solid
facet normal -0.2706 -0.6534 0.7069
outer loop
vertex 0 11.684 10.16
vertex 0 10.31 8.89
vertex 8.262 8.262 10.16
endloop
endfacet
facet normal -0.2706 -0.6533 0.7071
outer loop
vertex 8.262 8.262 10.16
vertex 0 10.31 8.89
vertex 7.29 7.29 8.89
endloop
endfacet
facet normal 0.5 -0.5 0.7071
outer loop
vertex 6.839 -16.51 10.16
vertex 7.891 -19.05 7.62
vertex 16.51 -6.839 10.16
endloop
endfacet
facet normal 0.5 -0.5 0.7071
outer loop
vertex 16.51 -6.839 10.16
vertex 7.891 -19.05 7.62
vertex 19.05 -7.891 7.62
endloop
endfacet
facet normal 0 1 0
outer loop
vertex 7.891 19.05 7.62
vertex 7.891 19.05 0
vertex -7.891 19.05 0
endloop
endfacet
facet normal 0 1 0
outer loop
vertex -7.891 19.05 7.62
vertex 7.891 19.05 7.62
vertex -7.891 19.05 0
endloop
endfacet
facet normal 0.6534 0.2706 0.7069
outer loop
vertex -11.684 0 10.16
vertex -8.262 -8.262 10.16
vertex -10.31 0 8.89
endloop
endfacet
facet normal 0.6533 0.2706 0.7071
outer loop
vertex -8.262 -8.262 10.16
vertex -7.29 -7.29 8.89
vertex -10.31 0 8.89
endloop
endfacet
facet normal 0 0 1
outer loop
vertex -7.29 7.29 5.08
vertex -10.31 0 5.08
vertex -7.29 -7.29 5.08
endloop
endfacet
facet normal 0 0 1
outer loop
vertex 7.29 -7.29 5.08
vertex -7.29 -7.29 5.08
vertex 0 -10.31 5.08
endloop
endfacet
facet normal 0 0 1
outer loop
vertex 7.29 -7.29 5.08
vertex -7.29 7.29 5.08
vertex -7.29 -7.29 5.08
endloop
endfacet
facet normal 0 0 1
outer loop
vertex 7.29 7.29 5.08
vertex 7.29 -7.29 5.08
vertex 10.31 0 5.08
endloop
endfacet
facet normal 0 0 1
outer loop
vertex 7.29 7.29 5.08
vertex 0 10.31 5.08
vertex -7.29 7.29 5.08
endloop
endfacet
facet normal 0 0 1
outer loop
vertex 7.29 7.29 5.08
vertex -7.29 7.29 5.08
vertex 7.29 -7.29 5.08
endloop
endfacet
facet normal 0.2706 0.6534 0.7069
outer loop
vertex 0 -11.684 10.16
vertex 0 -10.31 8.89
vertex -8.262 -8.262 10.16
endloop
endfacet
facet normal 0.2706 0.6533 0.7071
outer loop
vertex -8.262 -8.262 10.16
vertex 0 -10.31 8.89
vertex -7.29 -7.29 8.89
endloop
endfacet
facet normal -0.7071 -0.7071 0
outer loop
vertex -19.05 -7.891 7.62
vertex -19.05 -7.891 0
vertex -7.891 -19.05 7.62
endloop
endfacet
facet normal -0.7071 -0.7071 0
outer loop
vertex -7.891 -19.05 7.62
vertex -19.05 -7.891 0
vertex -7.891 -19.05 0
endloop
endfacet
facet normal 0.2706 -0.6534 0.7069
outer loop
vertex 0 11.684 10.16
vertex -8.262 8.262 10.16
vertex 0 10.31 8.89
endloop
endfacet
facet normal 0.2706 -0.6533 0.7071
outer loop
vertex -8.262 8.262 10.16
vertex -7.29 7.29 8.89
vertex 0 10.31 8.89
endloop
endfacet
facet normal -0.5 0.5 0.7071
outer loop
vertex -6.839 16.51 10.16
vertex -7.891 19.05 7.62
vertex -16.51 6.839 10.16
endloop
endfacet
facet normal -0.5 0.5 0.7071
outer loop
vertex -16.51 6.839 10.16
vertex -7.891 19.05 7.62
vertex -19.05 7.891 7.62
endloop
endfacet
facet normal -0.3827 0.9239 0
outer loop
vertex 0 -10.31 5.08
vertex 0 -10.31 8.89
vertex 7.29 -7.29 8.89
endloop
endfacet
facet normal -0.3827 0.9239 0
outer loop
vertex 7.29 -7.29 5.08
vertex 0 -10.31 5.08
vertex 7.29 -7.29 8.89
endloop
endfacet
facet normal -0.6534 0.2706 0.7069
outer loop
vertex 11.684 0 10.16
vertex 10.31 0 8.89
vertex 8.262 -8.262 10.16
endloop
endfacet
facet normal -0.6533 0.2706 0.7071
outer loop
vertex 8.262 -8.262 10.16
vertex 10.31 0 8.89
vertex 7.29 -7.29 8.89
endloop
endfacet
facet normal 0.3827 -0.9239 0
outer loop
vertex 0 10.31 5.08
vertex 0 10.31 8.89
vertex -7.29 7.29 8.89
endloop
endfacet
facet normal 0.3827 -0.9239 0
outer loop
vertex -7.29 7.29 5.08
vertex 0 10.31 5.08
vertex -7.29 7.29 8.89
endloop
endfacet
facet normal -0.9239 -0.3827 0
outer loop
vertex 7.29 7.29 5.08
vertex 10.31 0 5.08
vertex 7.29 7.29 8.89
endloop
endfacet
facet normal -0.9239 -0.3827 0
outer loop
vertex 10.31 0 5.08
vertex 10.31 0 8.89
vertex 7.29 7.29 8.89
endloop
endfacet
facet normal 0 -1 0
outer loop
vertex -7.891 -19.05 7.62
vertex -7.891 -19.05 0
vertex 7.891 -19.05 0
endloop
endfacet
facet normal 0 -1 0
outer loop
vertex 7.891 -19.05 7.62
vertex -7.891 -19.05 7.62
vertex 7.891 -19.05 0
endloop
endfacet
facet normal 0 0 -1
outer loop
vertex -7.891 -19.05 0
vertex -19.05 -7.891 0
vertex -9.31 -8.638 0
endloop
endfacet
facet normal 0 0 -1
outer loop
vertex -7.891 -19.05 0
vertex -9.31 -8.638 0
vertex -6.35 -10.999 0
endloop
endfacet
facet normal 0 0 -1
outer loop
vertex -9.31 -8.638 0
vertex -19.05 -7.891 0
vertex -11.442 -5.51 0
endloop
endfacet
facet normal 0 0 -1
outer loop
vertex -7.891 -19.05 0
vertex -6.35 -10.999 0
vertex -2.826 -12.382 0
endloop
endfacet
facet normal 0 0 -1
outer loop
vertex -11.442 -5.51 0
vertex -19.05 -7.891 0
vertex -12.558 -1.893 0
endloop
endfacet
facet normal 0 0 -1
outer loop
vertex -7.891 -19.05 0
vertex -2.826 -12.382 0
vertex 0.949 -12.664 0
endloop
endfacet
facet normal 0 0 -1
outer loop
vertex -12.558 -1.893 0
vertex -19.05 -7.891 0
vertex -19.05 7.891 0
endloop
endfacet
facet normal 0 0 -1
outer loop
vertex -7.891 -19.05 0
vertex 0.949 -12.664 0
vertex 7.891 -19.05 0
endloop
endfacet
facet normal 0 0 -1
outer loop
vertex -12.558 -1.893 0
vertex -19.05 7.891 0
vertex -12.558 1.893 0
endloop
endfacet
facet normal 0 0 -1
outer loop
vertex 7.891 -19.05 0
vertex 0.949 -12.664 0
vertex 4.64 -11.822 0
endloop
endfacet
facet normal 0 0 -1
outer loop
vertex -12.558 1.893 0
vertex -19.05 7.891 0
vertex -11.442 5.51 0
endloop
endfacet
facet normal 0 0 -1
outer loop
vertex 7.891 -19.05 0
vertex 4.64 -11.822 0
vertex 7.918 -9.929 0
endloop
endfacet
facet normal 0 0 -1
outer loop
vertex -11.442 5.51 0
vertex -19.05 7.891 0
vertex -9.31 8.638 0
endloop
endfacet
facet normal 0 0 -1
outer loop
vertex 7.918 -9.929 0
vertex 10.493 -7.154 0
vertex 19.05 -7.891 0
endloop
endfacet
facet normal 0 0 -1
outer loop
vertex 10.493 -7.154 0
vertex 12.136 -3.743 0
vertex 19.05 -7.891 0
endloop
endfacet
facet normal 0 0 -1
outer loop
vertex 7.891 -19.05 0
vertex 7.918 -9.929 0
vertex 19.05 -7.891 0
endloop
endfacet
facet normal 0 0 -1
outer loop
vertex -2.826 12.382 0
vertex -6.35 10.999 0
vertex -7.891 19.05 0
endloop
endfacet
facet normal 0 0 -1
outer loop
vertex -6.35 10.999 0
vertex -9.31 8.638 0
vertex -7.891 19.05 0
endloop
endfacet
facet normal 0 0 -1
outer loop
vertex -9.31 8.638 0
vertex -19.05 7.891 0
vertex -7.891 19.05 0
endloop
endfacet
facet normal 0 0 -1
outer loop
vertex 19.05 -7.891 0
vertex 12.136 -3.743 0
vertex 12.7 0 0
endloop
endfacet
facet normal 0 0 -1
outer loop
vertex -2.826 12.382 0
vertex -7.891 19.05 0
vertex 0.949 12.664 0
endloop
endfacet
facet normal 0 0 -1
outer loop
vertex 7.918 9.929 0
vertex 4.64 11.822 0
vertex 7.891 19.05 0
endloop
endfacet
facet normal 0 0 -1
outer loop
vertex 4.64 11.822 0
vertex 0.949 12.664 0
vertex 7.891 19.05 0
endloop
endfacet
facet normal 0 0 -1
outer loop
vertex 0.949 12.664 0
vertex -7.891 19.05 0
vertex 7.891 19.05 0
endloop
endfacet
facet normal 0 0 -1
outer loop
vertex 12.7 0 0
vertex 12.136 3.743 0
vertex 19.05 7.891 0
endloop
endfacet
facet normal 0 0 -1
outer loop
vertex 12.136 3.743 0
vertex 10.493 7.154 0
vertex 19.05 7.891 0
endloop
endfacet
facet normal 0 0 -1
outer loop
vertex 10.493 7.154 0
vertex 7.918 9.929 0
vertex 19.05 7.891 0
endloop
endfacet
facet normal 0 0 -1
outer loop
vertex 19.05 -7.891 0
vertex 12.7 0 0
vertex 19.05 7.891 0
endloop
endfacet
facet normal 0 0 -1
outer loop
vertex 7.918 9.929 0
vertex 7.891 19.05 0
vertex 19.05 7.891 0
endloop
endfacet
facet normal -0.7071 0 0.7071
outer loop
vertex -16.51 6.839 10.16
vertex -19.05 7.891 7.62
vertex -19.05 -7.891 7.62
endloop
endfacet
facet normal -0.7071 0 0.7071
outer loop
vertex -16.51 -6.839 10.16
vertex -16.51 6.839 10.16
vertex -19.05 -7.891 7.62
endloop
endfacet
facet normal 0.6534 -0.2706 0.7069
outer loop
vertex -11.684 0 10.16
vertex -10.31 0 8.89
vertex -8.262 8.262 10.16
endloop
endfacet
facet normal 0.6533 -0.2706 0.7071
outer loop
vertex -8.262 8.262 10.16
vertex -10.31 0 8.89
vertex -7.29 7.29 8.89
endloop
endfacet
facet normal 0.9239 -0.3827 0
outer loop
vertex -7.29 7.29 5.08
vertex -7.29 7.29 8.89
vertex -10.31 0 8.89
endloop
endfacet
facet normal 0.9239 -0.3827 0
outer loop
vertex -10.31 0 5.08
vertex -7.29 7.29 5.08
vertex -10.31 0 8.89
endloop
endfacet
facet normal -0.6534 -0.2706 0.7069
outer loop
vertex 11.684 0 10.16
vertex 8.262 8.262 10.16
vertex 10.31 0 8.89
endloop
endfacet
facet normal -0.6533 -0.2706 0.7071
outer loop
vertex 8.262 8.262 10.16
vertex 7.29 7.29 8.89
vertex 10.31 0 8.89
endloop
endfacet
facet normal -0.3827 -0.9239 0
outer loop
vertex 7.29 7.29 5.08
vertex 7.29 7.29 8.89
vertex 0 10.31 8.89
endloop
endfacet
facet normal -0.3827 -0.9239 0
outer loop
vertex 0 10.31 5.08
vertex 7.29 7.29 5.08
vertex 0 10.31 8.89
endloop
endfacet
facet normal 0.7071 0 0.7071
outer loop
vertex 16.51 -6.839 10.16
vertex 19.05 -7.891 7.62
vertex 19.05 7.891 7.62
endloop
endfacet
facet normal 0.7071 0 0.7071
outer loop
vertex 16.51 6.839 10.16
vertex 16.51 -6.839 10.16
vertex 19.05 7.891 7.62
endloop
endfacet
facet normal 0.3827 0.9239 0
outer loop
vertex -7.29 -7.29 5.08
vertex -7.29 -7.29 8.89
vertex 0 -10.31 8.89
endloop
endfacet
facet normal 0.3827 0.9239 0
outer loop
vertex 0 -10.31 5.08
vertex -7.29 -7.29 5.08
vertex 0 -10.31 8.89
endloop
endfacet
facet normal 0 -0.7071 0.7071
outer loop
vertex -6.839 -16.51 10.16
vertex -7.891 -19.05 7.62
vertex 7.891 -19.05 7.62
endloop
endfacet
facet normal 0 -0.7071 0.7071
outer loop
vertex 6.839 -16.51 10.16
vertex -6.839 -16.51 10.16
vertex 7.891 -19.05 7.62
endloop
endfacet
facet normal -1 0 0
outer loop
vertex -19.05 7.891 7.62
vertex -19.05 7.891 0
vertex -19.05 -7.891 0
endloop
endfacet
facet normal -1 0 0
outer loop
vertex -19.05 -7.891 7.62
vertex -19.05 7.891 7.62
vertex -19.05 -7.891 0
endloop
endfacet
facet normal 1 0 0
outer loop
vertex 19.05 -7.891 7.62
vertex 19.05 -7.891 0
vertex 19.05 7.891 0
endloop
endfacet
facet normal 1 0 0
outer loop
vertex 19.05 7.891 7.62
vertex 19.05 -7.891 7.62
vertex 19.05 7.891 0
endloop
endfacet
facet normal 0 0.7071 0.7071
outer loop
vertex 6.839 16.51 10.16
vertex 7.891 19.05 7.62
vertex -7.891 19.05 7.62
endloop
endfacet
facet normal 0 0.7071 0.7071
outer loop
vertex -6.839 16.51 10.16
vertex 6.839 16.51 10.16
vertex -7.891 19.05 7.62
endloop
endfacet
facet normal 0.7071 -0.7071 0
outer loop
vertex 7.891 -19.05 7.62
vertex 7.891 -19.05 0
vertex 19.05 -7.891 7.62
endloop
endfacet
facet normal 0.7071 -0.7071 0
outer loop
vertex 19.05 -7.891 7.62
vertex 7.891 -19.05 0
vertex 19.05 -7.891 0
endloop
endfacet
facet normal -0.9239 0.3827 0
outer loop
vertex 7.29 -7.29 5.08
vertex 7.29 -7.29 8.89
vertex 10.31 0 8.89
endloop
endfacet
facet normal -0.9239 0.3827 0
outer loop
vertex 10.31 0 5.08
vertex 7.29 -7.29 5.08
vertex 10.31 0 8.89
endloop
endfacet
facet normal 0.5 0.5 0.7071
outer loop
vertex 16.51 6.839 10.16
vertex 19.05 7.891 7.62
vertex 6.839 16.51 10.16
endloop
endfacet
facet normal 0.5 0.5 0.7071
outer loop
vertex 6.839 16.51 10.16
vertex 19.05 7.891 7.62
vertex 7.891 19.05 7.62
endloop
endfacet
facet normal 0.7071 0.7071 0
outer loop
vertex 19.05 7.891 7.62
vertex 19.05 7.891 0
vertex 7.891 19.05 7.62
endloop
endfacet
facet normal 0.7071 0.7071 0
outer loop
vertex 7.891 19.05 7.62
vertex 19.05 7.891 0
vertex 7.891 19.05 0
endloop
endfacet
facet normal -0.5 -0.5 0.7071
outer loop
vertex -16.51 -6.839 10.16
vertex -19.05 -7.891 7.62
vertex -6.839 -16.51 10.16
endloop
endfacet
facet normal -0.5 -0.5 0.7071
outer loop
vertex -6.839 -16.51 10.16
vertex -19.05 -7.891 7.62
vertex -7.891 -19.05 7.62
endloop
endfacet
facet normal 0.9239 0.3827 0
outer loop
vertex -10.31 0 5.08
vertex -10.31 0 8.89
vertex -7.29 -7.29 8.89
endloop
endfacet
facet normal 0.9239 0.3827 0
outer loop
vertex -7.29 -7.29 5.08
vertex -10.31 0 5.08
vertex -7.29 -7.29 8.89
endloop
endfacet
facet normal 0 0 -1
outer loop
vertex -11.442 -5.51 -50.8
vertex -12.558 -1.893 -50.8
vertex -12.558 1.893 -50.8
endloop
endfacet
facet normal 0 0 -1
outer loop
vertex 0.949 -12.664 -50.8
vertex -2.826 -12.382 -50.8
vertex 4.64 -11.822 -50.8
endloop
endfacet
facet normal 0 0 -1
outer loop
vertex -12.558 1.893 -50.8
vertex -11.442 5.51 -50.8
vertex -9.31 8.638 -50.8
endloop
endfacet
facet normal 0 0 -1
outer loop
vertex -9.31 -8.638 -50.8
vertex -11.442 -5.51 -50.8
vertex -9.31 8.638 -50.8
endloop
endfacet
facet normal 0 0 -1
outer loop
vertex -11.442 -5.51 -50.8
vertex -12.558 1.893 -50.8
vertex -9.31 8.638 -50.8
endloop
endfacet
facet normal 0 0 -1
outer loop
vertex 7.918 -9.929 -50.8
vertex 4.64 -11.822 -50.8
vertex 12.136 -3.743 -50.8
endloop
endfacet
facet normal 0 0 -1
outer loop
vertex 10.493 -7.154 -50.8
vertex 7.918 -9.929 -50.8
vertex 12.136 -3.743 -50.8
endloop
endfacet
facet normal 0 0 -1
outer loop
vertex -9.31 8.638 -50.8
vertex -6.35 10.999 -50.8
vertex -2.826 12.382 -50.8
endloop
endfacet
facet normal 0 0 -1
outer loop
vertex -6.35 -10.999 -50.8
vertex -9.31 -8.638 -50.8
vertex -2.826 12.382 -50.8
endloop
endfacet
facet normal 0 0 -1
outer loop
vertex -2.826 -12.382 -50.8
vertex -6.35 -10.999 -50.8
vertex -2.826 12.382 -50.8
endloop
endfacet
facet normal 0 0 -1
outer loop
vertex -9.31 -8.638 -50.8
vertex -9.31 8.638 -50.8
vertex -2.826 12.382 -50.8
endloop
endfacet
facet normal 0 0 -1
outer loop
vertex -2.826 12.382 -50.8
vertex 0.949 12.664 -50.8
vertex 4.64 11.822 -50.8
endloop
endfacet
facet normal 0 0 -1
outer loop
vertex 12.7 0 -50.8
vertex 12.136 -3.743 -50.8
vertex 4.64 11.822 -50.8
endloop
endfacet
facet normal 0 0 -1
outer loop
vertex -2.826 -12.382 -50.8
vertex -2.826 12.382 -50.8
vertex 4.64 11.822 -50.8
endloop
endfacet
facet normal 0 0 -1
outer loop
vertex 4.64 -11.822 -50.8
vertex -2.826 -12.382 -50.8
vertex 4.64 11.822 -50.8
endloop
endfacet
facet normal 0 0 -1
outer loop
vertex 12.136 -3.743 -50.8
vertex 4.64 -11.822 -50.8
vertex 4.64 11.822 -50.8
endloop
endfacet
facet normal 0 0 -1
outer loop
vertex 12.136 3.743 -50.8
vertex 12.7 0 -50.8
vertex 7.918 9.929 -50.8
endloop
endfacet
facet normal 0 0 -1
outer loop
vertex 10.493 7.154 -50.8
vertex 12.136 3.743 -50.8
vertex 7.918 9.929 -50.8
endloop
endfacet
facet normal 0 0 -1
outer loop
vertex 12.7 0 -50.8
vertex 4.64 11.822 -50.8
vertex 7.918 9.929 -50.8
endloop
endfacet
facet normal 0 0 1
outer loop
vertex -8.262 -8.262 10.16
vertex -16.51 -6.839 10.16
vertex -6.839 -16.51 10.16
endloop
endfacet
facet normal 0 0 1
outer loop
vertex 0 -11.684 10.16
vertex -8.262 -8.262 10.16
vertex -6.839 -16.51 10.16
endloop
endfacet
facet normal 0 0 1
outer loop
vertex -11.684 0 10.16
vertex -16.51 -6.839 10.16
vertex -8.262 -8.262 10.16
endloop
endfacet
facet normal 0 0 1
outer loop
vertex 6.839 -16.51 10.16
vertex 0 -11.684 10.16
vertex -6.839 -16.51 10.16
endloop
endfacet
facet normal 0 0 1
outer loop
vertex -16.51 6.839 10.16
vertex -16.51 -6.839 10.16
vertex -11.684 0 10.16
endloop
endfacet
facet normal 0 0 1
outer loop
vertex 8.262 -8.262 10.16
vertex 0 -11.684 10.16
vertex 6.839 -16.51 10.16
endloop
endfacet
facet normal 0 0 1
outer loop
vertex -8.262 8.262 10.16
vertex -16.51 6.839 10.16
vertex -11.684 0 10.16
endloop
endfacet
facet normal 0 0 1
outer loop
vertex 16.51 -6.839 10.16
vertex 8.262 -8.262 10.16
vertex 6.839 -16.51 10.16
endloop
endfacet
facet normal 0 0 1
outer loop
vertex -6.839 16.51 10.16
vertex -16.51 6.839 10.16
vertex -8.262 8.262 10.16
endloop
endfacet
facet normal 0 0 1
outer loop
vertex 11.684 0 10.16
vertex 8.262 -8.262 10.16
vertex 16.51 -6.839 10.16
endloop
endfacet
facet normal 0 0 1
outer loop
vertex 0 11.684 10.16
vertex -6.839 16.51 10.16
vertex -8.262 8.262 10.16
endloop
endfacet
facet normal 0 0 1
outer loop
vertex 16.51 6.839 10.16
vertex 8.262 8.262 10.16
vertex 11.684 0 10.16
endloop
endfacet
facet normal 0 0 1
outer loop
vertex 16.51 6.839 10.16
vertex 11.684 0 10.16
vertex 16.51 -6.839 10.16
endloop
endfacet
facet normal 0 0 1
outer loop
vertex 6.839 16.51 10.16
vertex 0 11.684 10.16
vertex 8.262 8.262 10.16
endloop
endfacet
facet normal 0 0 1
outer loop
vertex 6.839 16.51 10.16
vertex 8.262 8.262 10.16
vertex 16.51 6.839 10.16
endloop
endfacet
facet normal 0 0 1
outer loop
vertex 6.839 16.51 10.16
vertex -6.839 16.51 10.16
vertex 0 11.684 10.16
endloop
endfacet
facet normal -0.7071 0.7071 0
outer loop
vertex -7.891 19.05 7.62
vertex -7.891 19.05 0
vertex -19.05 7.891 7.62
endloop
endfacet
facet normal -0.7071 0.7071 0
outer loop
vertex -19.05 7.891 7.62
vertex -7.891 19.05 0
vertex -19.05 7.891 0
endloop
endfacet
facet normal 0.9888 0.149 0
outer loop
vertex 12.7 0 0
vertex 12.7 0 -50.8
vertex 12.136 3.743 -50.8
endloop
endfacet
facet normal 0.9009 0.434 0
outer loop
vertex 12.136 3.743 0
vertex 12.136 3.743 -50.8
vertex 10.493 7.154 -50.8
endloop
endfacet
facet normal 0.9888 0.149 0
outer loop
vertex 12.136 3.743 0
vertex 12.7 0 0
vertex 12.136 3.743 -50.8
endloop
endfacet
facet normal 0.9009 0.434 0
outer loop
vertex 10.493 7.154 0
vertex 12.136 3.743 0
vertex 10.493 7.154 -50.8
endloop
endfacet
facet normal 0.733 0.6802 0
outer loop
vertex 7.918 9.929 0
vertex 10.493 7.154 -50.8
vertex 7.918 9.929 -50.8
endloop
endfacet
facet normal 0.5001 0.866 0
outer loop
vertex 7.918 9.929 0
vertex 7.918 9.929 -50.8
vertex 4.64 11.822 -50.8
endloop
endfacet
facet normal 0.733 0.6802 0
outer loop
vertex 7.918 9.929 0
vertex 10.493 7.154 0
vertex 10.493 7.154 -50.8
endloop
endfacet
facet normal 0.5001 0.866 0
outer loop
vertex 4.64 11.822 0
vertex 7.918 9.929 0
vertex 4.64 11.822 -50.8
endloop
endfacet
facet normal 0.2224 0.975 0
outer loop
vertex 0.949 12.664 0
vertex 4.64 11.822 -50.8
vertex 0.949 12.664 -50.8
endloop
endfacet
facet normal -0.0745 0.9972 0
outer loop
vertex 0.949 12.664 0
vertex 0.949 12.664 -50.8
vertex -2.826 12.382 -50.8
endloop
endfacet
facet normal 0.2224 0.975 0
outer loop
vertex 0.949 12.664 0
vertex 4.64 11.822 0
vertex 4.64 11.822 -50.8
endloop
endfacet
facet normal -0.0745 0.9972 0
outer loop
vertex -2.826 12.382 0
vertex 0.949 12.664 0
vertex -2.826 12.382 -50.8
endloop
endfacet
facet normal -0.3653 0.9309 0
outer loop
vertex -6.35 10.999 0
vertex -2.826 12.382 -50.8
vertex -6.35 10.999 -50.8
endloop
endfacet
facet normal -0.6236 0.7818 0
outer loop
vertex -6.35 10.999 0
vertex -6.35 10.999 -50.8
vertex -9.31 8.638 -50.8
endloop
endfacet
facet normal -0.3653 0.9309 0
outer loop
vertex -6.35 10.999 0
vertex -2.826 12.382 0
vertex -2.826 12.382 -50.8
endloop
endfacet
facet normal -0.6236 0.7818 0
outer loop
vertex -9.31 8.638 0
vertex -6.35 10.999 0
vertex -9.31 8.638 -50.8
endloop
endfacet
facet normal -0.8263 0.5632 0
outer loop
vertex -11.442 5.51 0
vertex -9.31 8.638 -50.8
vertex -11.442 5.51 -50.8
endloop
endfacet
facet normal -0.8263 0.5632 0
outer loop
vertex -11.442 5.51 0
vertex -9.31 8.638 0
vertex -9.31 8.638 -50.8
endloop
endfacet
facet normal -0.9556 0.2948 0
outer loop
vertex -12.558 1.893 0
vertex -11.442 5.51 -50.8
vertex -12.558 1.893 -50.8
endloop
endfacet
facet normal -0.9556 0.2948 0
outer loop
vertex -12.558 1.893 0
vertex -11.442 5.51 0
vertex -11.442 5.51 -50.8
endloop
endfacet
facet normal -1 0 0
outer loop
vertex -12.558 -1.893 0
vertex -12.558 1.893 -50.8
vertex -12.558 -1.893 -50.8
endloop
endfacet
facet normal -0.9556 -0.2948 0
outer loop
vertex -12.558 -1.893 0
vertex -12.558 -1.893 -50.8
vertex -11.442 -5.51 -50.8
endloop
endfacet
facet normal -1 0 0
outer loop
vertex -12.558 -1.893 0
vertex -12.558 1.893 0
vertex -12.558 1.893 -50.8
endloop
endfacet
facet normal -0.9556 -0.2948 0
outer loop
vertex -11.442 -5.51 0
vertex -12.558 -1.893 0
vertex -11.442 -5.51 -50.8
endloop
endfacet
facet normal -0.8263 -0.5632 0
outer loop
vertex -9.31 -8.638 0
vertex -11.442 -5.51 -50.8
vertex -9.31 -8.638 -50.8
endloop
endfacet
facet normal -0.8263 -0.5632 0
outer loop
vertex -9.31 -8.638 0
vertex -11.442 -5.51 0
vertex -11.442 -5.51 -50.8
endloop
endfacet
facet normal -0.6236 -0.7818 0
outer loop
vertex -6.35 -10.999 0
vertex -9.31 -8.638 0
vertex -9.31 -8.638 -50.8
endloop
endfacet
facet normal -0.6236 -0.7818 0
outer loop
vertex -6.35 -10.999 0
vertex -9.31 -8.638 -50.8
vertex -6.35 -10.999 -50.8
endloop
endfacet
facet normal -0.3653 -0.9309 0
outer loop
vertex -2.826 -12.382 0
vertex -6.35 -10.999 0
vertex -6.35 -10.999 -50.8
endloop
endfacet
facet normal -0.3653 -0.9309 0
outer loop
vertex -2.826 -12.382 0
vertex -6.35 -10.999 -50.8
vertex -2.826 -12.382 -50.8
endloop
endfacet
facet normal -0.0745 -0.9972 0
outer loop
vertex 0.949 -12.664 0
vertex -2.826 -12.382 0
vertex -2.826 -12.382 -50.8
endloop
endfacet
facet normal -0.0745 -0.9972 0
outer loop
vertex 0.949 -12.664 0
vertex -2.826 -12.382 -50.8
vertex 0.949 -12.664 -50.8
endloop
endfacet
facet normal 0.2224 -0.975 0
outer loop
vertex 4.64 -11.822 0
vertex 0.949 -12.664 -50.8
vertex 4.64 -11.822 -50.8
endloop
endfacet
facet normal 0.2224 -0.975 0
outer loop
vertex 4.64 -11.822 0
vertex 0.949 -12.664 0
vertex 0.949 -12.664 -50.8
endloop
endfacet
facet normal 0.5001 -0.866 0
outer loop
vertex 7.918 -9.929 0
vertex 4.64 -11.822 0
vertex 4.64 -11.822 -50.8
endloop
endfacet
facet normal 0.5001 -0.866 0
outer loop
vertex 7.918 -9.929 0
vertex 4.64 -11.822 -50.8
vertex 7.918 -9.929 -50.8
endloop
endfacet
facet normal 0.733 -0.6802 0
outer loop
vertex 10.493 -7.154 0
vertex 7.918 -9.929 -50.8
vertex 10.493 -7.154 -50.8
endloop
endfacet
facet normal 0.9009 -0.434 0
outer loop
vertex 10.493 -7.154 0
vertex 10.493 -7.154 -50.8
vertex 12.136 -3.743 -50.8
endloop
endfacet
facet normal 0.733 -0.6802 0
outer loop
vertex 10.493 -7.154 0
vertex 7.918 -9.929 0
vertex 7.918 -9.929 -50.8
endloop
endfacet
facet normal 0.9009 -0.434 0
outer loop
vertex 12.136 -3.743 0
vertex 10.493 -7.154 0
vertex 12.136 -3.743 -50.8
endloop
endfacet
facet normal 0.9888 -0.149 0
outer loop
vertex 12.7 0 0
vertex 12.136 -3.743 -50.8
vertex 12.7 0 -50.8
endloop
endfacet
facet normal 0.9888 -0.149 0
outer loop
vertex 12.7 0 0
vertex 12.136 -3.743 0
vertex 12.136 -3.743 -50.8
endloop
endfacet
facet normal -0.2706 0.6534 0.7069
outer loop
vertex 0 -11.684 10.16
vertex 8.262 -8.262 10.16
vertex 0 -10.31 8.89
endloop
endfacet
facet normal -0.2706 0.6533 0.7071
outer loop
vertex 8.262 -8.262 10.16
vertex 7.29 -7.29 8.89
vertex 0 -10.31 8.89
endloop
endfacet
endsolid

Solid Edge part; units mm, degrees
sketch "Sketch1" plane through (0, 0, 0) normal (0, 0, 1) x (1, 0, 0)
  line L0 (19.05, -7.8908) -> (19.05, 7.8908)
  line L1 (19.05, 7.8908) -> (7.8908, 19.05)
  line L2 (7.8908, 19.05) -> (-7.8908, 19.05)
  line L3 (-7.8908, 19.05) -> (-19.05, 7.8908)
  line L4 (-19.05, 7.8908) -> (-19.05, -7.8908)
  line L5 (-19.05, -7.8908) -> (-7.8908, -19.05)
  line L6 (-7.8908, -19.05) -> (7.8908, -19.05)
  line L7 (7.8908, -19.05) -> (19.05, -7.8908)
extrude "Protrusion1" add sketch "Sketch1" along normal blind 10.16
sketch "Sketch2" plane through (0, 0, 0) normal (0, 0, 1) x (1, 0, 0)
  circle A0 centre (0, 0) radius 12.7
extrude "ExtrudedProtrusion_2" add sketch "Sketch2" against normal blind 50.8
sketch "Sketch3" plane through (0, 0, 10.16) normal (0, 0, 1) x (0, 1, 0)
  line L0 (-10.3098, 0) -> (-7.2901, -7.2901)
  line L1 (-7.2901, -7.2901) -> (0, -10.3098)
  line L2 (0, -10.3098) -> (7.2901, -7.2901)
  line L3 (7.2901, -7.2901) -> (10.3098, 0)
  line L4 (10.3098, 0) -> (7.2901, 7.2901)
  line L5 (7.2901, 7.2901) -> (0, 10.3098)
  line L6 (0, 10.3098) -> (-7.2901, 7.2901)
  line L7 (-7.2901, 7.2901) -> (-10.3098, 0)
extrude "ExtrudedCutout_1" cut sketch "Sketch3" against normal blind 5.08
chamfer "Chamfer_1" distance 1.27 angle 45 8 edges at (-8.8, 3.6451, 10.16) (-3.6451, 8.8, 10.16) (3.6451, 8.8, 10.16) (8.8, 3.6451, 10.16) (8.8, -3.6451, 10.16) (3.6451, -8.8, 10.16) (-3.6451, -8.8, 10.16) (-8.8, -3.6451, 10.16)
chamfer "Chamfer_2" distance 2.54 angle 45 8 edges at (13.4704, -13.4704, 10.16) (19.05, 0, 10.16) (13.4704, 13.4704, 10.16) (0, 19.05, 10.16) (-13.4704, 13.4704, 10.16) (-19.05, 0, 10.16) (-13.4704, -13.4704, 10.16) (0, -19.05, 10.16)
